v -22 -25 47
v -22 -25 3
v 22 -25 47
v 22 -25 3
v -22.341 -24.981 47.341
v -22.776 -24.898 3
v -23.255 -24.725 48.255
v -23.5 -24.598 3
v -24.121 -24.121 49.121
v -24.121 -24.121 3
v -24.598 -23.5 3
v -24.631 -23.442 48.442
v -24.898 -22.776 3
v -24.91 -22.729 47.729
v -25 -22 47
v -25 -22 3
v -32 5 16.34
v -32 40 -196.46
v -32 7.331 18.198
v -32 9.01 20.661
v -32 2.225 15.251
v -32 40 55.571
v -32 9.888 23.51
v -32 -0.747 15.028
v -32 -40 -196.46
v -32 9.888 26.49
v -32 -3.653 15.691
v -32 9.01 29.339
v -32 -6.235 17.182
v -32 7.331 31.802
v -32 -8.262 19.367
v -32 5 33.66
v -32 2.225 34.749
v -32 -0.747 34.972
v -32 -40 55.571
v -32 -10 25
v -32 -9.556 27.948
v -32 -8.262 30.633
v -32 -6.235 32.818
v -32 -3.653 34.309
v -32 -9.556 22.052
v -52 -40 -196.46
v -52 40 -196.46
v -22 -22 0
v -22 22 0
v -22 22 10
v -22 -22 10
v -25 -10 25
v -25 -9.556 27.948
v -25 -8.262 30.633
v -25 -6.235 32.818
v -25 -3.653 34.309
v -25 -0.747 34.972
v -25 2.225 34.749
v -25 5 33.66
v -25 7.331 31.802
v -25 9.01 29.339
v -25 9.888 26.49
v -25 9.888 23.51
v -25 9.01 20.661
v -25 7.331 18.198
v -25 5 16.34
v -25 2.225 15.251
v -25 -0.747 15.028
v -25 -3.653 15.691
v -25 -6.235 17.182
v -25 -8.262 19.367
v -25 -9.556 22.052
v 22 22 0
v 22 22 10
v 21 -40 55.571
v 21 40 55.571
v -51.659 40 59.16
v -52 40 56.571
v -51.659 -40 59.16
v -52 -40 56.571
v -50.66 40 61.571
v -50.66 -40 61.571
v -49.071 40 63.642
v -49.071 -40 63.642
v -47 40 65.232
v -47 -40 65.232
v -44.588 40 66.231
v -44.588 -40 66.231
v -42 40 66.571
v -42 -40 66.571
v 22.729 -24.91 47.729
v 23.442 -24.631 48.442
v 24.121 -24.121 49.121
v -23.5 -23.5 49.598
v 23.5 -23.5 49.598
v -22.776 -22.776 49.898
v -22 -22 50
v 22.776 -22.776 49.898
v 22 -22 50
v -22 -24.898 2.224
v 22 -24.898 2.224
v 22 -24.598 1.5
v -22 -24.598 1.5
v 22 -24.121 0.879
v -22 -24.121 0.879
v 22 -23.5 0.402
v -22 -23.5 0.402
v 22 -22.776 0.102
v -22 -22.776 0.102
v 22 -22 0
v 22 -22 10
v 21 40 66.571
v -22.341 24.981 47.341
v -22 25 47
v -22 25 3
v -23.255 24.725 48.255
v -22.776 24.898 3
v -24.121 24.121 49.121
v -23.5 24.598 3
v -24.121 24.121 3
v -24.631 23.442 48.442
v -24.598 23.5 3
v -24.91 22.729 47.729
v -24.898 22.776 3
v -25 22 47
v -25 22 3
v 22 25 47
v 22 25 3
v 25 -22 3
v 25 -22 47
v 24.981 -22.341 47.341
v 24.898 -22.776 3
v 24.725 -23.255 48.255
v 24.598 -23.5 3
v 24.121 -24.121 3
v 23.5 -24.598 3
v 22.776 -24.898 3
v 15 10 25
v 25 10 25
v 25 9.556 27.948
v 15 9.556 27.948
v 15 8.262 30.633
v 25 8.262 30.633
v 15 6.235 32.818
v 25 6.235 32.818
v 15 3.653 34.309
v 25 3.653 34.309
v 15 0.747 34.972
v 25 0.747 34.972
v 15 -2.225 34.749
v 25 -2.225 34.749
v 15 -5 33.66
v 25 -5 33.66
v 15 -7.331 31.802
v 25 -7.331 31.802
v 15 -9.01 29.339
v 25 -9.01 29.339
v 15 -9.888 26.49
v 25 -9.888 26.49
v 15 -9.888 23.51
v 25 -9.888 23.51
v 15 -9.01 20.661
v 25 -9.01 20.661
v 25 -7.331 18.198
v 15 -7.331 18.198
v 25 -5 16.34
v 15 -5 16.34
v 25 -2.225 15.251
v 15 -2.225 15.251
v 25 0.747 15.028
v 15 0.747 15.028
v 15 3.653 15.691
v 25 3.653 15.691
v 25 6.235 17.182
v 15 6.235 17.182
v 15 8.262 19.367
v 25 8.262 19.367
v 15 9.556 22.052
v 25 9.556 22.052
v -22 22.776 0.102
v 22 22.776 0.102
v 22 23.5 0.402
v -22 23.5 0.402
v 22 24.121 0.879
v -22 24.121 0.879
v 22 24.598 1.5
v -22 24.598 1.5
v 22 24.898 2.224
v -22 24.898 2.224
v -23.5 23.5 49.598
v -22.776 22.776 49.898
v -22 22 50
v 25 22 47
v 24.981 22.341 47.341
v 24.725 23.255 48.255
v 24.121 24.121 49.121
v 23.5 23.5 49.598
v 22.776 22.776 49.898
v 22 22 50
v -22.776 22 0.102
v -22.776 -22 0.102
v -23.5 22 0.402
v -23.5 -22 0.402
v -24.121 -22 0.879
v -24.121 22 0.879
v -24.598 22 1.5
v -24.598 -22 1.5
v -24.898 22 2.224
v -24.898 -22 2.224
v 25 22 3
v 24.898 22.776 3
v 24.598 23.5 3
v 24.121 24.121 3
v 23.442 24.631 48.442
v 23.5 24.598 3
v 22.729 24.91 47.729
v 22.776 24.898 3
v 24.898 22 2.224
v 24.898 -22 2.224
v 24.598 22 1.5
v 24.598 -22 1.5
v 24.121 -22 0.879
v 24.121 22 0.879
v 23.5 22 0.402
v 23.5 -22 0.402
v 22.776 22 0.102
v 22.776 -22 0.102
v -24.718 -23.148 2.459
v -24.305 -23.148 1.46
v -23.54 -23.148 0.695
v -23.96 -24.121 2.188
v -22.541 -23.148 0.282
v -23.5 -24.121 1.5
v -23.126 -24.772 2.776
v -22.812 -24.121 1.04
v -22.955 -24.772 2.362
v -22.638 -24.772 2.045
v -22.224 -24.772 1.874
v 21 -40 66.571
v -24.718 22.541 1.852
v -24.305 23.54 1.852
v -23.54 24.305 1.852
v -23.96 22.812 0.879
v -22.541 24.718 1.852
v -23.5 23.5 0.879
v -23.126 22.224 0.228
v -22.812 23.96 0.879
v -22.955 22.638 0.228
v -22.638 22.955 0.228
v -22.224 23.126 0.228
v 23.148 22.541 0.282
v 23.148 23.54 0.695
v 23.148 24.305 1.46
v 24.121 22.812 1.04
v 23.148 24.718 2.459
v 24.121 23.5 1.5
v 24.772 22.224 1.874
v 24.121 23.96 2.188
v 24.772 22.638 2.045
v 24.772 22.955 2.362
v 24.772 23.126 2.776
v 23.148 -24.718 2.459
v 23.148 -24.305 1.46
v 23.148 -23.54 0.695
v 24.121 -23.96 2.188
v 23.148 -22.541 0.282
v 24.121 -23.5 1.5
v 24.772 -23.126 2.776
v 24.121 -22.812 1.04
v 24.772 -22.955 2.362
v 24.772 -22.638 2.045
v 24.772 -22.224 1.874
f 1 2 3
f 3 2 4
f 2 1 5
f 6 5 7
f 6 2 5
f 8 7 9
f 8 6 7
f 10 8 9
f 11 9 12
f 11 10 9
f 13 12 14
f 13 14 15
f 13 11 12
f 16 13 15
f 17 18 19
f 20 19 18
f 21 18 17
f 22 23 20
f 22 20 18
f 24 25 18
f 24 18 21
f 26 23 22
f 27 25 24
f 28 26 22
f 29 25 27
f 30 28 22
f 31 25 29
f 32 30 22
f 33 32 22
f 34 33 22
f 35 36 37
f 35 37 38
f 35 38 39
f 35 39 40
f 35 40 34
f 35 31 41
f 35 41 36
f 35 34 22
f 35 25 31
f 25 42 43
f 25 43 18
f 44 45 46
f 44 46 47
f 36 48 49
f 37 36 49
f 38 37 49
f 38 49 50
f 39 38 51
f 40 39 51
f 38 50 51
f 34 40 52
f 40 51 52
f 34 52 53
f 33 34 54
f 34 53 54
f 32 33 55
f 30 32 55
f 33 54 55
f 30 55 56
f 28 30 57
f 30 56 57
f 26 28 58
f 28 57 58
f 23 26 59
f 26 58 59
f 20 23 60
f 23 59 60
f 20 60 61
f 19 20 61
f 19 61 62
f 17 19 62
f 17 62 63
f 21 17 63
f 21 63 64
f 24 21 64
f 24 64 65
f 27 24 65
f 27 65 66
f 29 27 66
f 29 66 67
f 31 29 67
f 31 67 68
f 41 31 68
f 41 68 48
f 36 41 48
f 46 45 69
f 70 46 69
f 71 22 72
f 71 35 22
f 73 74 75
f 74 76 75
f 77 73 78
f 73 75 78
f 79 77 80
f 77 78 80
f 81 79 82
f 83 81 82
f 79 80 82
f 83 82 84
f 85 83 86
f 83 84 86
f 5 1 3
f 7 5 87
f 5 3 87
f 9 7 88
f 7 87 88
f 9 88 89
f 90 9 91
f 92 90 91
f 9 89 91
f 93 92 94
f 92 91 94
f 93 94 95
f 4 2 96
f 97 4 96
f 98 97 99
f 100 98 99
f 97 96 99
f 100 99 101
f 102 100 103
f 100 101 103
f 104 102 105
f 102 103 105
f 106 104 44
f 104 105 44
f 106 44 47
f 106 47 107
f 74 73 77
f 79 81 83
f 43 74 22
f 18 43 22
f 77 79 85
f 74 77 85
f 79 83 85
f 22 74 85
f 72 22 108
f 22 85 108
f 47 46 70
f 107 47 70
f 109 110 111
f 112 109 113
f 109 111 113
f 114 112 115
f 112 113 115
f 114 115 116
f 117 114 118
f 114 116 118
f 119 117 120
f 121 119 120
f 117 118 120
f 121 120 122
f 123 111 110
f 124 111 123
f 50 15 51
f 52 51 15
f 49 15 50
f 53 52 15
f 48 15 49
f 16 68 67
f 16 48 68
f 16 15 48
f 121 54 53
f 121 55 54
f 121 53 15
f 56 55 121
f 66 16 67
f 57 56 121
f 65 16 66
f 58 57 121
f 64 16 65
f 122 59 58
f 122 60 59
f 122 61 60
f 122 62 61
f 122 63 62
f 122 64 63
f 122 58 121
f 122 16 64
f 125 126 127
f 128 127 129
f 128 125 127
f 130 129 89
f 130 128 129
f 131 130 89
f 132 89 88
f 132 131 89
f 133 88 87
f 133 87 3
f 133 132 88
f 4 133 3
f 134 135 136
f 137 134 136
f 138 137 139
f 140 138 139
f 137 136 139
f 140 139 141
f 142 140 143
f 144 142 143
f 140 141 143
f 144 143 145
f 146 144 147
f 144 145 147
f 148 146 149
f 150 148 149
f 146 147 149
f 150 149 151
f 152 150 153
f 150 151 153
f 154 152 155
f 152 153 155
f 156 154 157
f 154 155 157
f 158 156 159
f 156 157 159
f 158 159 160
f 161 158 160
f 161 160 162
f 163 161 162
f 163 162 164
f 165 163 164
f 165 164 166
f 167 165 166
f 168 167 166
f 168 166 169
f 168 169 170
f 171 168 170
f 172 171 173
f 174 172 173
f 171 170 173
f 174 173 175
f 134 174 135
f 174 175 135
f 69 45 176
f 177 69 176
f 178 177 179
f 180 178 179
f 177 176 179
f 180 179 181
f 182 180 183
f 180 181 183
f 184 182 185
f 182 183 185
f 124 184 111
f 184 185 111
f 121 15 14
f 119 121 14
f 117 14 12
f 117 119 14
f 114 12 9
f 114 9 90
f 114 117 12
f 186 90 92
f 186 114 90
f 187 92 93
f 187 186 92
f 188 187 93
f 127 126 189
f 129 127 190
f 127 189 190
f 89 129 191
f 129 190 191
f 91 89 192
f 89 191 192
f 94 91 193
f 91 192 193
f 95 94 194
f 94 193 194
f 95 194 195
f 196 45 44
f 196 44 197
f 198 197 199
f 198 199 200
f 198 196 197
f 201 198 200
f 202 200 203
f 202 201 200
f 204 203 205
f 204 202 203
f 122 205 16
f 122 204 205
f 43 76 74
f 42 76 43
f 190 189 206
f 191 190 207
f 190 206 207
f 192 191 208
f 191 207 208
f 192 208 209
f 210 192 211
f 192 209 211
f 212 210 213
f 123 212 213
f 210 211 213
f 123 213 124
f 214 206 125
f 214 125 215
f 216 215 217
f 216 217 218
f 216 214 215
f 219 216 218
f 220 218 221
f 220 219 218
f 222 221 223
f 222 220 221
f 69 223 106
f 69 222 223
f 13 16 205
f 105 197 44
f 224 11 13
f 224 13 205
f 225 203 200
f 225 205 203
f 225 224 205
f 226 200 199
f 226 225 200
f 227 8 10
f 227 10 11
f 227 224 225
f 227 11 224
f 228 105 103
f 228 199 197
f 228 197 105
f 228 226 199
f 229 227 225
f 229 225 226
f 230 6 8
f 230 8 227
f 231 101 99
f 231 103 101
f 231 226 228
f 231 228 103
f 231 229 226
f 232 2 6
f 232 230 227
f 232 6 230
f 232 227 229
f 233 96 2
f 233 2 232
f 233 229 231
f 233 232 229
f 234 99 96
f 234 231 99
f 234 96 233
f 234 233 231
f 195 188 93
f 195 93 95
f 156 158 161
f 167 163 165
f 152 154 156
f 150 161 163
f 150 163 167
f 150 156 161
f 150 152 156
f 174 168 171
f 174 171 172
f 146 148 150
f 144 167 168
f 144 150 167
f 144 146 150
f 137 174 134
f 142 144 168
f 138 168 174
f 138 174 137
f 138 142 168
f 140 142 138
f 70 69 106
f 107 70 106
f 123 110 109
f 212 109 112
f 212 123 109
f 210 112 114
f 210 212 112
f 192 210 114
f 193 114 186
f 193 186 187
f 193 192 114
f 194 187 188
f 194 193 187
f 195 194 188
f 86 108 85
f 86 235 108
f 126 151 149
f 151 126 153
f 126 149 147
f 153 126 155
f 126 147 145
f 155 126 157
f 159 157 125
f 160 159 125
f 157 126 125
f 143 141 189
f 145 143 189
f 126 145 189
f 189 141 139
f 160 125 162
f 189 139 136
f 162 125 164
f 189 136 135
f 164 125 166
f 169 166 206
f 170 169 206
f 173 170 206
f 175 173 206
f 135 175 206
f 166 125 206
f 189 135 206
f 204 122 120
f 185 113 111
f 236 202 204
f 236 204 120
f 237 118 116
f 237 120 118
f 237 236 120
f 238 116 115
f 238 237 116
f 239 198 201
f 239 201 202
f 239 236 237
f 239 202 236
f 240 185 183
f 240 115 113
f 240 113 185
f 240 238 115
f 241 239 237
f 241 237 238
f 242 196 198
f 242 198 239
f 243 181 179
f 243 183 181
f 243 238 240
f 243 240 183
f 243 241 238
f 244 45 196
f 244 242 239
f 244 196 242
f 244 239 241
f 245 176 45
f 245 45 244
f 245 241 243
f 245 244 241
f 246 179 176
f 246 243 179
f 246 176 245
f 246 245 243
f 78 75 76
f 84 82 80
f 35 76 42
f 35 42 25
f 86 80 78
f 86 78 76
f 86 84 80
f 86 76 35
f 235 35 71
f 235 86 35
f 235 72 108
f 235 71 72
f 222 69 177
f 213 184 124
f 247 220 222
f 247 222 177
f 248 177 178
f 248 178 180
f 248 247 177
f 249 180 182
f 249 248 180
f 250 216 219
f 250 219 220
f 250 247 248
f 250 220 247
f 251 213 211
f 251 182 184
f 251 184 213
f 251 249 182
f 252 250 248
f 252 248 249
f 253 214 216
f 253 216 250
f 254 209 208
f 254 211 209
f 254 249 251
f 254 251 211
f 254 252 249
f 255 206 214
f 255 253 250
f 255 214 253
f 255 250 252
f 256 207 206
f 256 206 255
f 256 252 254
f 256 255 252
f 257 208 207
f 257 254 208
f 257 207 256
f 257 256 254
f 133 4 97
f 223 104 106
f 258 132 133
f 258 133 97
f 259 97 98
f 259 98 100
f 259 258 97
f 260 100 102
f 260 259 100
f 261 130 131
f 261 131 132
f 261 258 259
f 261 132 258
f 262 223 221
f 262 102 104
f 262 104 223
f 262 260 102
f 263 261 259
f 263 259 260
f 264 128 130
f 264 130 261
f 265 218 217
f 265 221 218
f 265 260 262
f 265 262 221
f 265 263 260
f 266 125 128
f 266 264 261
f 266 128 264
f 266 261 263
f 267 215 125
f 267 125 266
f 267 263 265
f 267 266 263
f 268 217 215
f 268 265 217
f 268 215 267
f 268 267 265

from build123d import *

# Parameters (mm, degrees)
F0_W           = 50
F0_H           = 50
F1_DEPTH       = 50
F2_R           = 3
F3_T1_DEPTH    = 51.5
F3_T3_DEPTH    = 44
F3_T5_DEPTH    = 44
F3_S9_W        = 3.06
F3_S9_H        = 3.06
F3_T10_DEPTH   = 3.06
F3_S15_W       = 3.06
F3_S15_H       = 3.06
F3_T16_DEPTH   = 3.06
F3_S21_W       = 3.06
F3_S21_H       = 3.06
F3_T22_DEPTH   = 3.06
F3_S27_W       = 3.06
F3_S27_H       = 3.06
F3_T28_DEPTH   = 3.06
F5_DEPTH       = 10
F6_R           = 10
F7_DEPTH       = 10
F4_R           = 10
F8_DEPTH       = 20
F10_DEPTH      = 40
F10_DEPTH_BACK = 40
F11_R          = 10


# Not quite as in the source:
# - a fillet or chamfer that OpenCascade refuses, or shapes differently, is made with other operations: its cross-section is extruded or revolved along the edge and cut away or added


with BuildPart() as f1:
    # F0 (on Top) → F1 (new body)
    with BuildSketch(Plane.XY):
        Rectangle(F0_W, F0_H)
    extrude(amount=F1_DEPTH)

    # F2
    f2_edges = [f1.edges().sort_by_distance(p)[0] for p in [
        (25, 0, 50),
        (0, 25, 50),
        (-25, 0, 50),
        (0, -25, 50),
    ]]
    fillet(f2_edges, radius=F2_R)

    # F3: fillet of radius 3 on 12 edges, made by hand

    # F3_s2 → F3_t1 (cut)
    with BuildSketch(Plane.XY.offset(3)):
        with BuildLine():
            ThreePointArc((-22, -25), (-24.1213203436, -24.1213203436), (-25, -22))
            Line((-25, -22), (-25, -25))
            Line((-25, -25), (-22, -25))
        make_face()
        with BuildLine():
            ThreePointArc((25, -22), (24.1213203436, -24.1213203436), (22, -25))
            Line((22, -25), (25, -25))
            Line((25, -25), (25, -22))
        make_face()
        with BuildLine():
            ThreePointArc((25, 22), (24.1213203436, 24.1213203436), (22, 25))
            Line((22, 25), (25, 25))
            Line((25, 25), (25, 22))
        make_face()
        with BuildLine():
            ThreePointArc((-22, 25), (-24.1213203436, 24.1213203436), (-25, 22))
            Line((-25, 22), (-25, 25))
            Line((-25, 25), (-22, 25))
        make_face()
    extrude(amount=F3_T1_DEPTH, mode=Mode.SUBTRACT)

    # F3_s4 → F3_t3 (cut)
    with BuildSketch(Plane.YZ.offset(-22)):
        with BuildLine():
            ThreePointArc((-25, 3), (-24.1213203436, 0.8786796564), (-22, 0))
            Line((-22, 0), (-25, 0))
            Line((-25, 0), (-25, 3))
        make_face()
        with BuildLine():
            ThreePointArc((22, 0), (24.1213203436, 0.8786796564), (25, 3))
            Line((25, 3), (25, 0))
            Line((25, 0), (22, 0))
        make_face()
    extrude(amount=F3_T3_DEPTH, mode=Mode.SUBTRACT)

    # F3_s6 → F3_t5 (cut)
    with BuildSketch(Plane.XZ.offset(-22)):
        with BuildLine():
            ThreePointArc((25, 3), (24.1213203436, 0.8786796564), (22, 0))
            Line((22, 0), (25, 0))
            Line((25, 0), (25, 3))
        make_face()
        with BuildLine():
            ThreePointArc((-22, 0), (-24.1213203436, 0.8786796564), (-25, 3))
            Line((-25, 3), (-25, 0))
            Line((-25, 0), (-22, 0))
        make_face()
    extrude(amount=F3_T5_DEPTH, mode=Mode.SUBTRACT)


with BuildPart() as f3_tool8:
    # F3_s9 → F3_t10 (new body)
    with BuildSketch(Plane.XZ.offset(22)):
        with Locations((-23.53, 1.47)):
            Rectangle(F3_S9_W, F3_S9_H)
    extrude(amount=F3_T10_DEPTH)

    # F3_s11 → F3_t12 (revolve, cut)
    with BuildSketch(Plane(origin=(-22, -22, 3), x_dir=(0.7071067812, 0, 0.7071067812), z_dir=(0.7071067812, 0, -0.7071067812))):
        with BuildLine():
            ThreePointArc((0, -3), (3, 0), (0, 3))
            Line((0, 3), (0, -3))
        make_face()
    revolve(axis=Axis((-22, -22, 3), (0, -1, 0)), mode=Mode.SUBTRACT)


with BuildPart() as f1_1:
    add(f1.part)

    # F3_t7: cut F3_tool8
    add(f3_tool8.part, mode=Mode.SUBTRACT)


with BuildPart() as f3_tool14:
    # F3_s15 → F3_t16 (new body)
    with BuildSketch(Plane.YZ.offset(22)):
        with Locations((-23.53, 1.47)):
            Rectangle(F3_S15_W, F3_S15_H)
    extrude(amount=F3_T16_DEPTH)

    # F3_s17 → F3_t18 (revolve, cut)
    with BuildSketch(Plane(origin=(22, -22, 3), x_dir=(0, 0.7071067812, 0.7071067812), z_dir=(0, 0.7071067812, -0.7071067812))):
        with BuildLine():
            ThreePointArc((0, -3), (3, 0), (0, 3))
            Line((0, 3), (0, -3))
        make_face()
    revolve(axis=Axis((22, -22, 3), (1, 0, 0)), mode=Mode.SUBTRACT)


with BuildPart() as f1_2:
    add(f1_1.part)

    # F3_t13: cut F3_tool14
    add(f3_tool14.part, mode=Mode.SUBTRACT)


with BuildPart() as f3_tool20:
    # F3_s21 → F3_t22 (new body)
    with BuildSketch(Plane.YZ.offset(22)):
        with Locations((23.53, 1.47)):
            Rectangle(F3_S21_W, F3_S21_H)
    extrude(amount=F3_T22_DEPTH)

    # F3_s23 → F3_t24 (revolve, cut)
    with BuildSketch(Plane(origin=(22, 22, 3), x_dir=(0, -0.7071067812, 0.7071067812), z_dir=(0, 0.7071067812, 0.7071067812))):
        with BuildLine():
            ThreePointArc((0, -3), (3, 0), (0, 3))
            Line((0, 3), (0, -3))
        make_face()
    revolve(axis=Axis((22, 22, 3), (1, 0, 0)), mode=Mode.SUBTRACT)


with BuildPart() as f1_3:
    add(f1_2.part)

    # F3_t19: cut F3_tool20
    add(f3_tool20.part, mode=Mode.SUBTRACT)


with BuildPart() as f3_tool26:
    # F3_s27 → F3_t28 (new body)
    with BuildSketch(Plane.XY.offset(3)):
        with Locations((-23.53, 23.53)):
            Rectangle(F3_S27_W, F3_S27_H)
    extrude(amount=-F3_T28_DEPTH)

    # F3_s29 → F3_t30 (revolve, cut)
    with BuildSketch(Plane(origin=(-22, 22, 3), x_dir=(0.7071067812, -0.7071067812, 0), z_dir=(0.7071067812, 0.7071067812, 0))):
        with BuildLine():
            ThreePointArc((0, -3), (3, 0), (0, 3))
            Line((0, 3), (0, -3))
        make_face()
    revolve(axis=Axis((-22, 22, 3), (0, 0, -1)), mode=Mode.SUBTRACT)


with BuildPart() as f1_4:
    add(f1_3.part)

    # F3_t25: cut F3_tool26
    add(f3_tool26.part, mode=Mode.SUBTRACT)

    # F5 (cut): a face of the model
    f5_faces = [f1_4.faces().sort_by_distance(p)[0] for p in [
        (0, 0, 0),
    ]]
    extrude(f5_faces, amount=-F5_DEPTH, mode=Mode.SUBTRACT)

    # F6 (on face) → F7 (cut)
    with BuildSketch(Plane.YZ.offset(25)):
        with Locations((0, 25)):
            Circle(F6_R)
    extrude(amount=-F7_DEPTH, mode=Mode.SUBTRACT)

    # F4 (on face) → F8 (join)
    with BuildSketch(Plane(origin=(-25, 0, 0), x_dir=(0, -1, 0), z_dir=(-1, 0, 0))):
        with Locations((0, 25)):
            Circle(F4_R)
    extrude(amount=F8_DEPTH)

    # F9 (on Front) → F10 (join, two sides)
    with BuildSketch(Plane.XZ) as f10_sk:
        Polygon((21, 55.5713325143), (21, 66.5713325143), (-52, 66.5713325143), (-52, -196.4604258537), (-32, -196.4604258537), (-32, 55.5713325143), align=None)
    extrude(amount=F10_DEPTH)
    extrude(f10_sk.sketch, amount=-F10_DEPTH_BACK)

    # F11
    f11_edges = [f1_4.edges().sort_by_distance(p)[0] for p in [
        (-52, 0, 66.571333),
    ]]
    fillet(f11_edges, radius=F11_R)


solid = f1_4.part
